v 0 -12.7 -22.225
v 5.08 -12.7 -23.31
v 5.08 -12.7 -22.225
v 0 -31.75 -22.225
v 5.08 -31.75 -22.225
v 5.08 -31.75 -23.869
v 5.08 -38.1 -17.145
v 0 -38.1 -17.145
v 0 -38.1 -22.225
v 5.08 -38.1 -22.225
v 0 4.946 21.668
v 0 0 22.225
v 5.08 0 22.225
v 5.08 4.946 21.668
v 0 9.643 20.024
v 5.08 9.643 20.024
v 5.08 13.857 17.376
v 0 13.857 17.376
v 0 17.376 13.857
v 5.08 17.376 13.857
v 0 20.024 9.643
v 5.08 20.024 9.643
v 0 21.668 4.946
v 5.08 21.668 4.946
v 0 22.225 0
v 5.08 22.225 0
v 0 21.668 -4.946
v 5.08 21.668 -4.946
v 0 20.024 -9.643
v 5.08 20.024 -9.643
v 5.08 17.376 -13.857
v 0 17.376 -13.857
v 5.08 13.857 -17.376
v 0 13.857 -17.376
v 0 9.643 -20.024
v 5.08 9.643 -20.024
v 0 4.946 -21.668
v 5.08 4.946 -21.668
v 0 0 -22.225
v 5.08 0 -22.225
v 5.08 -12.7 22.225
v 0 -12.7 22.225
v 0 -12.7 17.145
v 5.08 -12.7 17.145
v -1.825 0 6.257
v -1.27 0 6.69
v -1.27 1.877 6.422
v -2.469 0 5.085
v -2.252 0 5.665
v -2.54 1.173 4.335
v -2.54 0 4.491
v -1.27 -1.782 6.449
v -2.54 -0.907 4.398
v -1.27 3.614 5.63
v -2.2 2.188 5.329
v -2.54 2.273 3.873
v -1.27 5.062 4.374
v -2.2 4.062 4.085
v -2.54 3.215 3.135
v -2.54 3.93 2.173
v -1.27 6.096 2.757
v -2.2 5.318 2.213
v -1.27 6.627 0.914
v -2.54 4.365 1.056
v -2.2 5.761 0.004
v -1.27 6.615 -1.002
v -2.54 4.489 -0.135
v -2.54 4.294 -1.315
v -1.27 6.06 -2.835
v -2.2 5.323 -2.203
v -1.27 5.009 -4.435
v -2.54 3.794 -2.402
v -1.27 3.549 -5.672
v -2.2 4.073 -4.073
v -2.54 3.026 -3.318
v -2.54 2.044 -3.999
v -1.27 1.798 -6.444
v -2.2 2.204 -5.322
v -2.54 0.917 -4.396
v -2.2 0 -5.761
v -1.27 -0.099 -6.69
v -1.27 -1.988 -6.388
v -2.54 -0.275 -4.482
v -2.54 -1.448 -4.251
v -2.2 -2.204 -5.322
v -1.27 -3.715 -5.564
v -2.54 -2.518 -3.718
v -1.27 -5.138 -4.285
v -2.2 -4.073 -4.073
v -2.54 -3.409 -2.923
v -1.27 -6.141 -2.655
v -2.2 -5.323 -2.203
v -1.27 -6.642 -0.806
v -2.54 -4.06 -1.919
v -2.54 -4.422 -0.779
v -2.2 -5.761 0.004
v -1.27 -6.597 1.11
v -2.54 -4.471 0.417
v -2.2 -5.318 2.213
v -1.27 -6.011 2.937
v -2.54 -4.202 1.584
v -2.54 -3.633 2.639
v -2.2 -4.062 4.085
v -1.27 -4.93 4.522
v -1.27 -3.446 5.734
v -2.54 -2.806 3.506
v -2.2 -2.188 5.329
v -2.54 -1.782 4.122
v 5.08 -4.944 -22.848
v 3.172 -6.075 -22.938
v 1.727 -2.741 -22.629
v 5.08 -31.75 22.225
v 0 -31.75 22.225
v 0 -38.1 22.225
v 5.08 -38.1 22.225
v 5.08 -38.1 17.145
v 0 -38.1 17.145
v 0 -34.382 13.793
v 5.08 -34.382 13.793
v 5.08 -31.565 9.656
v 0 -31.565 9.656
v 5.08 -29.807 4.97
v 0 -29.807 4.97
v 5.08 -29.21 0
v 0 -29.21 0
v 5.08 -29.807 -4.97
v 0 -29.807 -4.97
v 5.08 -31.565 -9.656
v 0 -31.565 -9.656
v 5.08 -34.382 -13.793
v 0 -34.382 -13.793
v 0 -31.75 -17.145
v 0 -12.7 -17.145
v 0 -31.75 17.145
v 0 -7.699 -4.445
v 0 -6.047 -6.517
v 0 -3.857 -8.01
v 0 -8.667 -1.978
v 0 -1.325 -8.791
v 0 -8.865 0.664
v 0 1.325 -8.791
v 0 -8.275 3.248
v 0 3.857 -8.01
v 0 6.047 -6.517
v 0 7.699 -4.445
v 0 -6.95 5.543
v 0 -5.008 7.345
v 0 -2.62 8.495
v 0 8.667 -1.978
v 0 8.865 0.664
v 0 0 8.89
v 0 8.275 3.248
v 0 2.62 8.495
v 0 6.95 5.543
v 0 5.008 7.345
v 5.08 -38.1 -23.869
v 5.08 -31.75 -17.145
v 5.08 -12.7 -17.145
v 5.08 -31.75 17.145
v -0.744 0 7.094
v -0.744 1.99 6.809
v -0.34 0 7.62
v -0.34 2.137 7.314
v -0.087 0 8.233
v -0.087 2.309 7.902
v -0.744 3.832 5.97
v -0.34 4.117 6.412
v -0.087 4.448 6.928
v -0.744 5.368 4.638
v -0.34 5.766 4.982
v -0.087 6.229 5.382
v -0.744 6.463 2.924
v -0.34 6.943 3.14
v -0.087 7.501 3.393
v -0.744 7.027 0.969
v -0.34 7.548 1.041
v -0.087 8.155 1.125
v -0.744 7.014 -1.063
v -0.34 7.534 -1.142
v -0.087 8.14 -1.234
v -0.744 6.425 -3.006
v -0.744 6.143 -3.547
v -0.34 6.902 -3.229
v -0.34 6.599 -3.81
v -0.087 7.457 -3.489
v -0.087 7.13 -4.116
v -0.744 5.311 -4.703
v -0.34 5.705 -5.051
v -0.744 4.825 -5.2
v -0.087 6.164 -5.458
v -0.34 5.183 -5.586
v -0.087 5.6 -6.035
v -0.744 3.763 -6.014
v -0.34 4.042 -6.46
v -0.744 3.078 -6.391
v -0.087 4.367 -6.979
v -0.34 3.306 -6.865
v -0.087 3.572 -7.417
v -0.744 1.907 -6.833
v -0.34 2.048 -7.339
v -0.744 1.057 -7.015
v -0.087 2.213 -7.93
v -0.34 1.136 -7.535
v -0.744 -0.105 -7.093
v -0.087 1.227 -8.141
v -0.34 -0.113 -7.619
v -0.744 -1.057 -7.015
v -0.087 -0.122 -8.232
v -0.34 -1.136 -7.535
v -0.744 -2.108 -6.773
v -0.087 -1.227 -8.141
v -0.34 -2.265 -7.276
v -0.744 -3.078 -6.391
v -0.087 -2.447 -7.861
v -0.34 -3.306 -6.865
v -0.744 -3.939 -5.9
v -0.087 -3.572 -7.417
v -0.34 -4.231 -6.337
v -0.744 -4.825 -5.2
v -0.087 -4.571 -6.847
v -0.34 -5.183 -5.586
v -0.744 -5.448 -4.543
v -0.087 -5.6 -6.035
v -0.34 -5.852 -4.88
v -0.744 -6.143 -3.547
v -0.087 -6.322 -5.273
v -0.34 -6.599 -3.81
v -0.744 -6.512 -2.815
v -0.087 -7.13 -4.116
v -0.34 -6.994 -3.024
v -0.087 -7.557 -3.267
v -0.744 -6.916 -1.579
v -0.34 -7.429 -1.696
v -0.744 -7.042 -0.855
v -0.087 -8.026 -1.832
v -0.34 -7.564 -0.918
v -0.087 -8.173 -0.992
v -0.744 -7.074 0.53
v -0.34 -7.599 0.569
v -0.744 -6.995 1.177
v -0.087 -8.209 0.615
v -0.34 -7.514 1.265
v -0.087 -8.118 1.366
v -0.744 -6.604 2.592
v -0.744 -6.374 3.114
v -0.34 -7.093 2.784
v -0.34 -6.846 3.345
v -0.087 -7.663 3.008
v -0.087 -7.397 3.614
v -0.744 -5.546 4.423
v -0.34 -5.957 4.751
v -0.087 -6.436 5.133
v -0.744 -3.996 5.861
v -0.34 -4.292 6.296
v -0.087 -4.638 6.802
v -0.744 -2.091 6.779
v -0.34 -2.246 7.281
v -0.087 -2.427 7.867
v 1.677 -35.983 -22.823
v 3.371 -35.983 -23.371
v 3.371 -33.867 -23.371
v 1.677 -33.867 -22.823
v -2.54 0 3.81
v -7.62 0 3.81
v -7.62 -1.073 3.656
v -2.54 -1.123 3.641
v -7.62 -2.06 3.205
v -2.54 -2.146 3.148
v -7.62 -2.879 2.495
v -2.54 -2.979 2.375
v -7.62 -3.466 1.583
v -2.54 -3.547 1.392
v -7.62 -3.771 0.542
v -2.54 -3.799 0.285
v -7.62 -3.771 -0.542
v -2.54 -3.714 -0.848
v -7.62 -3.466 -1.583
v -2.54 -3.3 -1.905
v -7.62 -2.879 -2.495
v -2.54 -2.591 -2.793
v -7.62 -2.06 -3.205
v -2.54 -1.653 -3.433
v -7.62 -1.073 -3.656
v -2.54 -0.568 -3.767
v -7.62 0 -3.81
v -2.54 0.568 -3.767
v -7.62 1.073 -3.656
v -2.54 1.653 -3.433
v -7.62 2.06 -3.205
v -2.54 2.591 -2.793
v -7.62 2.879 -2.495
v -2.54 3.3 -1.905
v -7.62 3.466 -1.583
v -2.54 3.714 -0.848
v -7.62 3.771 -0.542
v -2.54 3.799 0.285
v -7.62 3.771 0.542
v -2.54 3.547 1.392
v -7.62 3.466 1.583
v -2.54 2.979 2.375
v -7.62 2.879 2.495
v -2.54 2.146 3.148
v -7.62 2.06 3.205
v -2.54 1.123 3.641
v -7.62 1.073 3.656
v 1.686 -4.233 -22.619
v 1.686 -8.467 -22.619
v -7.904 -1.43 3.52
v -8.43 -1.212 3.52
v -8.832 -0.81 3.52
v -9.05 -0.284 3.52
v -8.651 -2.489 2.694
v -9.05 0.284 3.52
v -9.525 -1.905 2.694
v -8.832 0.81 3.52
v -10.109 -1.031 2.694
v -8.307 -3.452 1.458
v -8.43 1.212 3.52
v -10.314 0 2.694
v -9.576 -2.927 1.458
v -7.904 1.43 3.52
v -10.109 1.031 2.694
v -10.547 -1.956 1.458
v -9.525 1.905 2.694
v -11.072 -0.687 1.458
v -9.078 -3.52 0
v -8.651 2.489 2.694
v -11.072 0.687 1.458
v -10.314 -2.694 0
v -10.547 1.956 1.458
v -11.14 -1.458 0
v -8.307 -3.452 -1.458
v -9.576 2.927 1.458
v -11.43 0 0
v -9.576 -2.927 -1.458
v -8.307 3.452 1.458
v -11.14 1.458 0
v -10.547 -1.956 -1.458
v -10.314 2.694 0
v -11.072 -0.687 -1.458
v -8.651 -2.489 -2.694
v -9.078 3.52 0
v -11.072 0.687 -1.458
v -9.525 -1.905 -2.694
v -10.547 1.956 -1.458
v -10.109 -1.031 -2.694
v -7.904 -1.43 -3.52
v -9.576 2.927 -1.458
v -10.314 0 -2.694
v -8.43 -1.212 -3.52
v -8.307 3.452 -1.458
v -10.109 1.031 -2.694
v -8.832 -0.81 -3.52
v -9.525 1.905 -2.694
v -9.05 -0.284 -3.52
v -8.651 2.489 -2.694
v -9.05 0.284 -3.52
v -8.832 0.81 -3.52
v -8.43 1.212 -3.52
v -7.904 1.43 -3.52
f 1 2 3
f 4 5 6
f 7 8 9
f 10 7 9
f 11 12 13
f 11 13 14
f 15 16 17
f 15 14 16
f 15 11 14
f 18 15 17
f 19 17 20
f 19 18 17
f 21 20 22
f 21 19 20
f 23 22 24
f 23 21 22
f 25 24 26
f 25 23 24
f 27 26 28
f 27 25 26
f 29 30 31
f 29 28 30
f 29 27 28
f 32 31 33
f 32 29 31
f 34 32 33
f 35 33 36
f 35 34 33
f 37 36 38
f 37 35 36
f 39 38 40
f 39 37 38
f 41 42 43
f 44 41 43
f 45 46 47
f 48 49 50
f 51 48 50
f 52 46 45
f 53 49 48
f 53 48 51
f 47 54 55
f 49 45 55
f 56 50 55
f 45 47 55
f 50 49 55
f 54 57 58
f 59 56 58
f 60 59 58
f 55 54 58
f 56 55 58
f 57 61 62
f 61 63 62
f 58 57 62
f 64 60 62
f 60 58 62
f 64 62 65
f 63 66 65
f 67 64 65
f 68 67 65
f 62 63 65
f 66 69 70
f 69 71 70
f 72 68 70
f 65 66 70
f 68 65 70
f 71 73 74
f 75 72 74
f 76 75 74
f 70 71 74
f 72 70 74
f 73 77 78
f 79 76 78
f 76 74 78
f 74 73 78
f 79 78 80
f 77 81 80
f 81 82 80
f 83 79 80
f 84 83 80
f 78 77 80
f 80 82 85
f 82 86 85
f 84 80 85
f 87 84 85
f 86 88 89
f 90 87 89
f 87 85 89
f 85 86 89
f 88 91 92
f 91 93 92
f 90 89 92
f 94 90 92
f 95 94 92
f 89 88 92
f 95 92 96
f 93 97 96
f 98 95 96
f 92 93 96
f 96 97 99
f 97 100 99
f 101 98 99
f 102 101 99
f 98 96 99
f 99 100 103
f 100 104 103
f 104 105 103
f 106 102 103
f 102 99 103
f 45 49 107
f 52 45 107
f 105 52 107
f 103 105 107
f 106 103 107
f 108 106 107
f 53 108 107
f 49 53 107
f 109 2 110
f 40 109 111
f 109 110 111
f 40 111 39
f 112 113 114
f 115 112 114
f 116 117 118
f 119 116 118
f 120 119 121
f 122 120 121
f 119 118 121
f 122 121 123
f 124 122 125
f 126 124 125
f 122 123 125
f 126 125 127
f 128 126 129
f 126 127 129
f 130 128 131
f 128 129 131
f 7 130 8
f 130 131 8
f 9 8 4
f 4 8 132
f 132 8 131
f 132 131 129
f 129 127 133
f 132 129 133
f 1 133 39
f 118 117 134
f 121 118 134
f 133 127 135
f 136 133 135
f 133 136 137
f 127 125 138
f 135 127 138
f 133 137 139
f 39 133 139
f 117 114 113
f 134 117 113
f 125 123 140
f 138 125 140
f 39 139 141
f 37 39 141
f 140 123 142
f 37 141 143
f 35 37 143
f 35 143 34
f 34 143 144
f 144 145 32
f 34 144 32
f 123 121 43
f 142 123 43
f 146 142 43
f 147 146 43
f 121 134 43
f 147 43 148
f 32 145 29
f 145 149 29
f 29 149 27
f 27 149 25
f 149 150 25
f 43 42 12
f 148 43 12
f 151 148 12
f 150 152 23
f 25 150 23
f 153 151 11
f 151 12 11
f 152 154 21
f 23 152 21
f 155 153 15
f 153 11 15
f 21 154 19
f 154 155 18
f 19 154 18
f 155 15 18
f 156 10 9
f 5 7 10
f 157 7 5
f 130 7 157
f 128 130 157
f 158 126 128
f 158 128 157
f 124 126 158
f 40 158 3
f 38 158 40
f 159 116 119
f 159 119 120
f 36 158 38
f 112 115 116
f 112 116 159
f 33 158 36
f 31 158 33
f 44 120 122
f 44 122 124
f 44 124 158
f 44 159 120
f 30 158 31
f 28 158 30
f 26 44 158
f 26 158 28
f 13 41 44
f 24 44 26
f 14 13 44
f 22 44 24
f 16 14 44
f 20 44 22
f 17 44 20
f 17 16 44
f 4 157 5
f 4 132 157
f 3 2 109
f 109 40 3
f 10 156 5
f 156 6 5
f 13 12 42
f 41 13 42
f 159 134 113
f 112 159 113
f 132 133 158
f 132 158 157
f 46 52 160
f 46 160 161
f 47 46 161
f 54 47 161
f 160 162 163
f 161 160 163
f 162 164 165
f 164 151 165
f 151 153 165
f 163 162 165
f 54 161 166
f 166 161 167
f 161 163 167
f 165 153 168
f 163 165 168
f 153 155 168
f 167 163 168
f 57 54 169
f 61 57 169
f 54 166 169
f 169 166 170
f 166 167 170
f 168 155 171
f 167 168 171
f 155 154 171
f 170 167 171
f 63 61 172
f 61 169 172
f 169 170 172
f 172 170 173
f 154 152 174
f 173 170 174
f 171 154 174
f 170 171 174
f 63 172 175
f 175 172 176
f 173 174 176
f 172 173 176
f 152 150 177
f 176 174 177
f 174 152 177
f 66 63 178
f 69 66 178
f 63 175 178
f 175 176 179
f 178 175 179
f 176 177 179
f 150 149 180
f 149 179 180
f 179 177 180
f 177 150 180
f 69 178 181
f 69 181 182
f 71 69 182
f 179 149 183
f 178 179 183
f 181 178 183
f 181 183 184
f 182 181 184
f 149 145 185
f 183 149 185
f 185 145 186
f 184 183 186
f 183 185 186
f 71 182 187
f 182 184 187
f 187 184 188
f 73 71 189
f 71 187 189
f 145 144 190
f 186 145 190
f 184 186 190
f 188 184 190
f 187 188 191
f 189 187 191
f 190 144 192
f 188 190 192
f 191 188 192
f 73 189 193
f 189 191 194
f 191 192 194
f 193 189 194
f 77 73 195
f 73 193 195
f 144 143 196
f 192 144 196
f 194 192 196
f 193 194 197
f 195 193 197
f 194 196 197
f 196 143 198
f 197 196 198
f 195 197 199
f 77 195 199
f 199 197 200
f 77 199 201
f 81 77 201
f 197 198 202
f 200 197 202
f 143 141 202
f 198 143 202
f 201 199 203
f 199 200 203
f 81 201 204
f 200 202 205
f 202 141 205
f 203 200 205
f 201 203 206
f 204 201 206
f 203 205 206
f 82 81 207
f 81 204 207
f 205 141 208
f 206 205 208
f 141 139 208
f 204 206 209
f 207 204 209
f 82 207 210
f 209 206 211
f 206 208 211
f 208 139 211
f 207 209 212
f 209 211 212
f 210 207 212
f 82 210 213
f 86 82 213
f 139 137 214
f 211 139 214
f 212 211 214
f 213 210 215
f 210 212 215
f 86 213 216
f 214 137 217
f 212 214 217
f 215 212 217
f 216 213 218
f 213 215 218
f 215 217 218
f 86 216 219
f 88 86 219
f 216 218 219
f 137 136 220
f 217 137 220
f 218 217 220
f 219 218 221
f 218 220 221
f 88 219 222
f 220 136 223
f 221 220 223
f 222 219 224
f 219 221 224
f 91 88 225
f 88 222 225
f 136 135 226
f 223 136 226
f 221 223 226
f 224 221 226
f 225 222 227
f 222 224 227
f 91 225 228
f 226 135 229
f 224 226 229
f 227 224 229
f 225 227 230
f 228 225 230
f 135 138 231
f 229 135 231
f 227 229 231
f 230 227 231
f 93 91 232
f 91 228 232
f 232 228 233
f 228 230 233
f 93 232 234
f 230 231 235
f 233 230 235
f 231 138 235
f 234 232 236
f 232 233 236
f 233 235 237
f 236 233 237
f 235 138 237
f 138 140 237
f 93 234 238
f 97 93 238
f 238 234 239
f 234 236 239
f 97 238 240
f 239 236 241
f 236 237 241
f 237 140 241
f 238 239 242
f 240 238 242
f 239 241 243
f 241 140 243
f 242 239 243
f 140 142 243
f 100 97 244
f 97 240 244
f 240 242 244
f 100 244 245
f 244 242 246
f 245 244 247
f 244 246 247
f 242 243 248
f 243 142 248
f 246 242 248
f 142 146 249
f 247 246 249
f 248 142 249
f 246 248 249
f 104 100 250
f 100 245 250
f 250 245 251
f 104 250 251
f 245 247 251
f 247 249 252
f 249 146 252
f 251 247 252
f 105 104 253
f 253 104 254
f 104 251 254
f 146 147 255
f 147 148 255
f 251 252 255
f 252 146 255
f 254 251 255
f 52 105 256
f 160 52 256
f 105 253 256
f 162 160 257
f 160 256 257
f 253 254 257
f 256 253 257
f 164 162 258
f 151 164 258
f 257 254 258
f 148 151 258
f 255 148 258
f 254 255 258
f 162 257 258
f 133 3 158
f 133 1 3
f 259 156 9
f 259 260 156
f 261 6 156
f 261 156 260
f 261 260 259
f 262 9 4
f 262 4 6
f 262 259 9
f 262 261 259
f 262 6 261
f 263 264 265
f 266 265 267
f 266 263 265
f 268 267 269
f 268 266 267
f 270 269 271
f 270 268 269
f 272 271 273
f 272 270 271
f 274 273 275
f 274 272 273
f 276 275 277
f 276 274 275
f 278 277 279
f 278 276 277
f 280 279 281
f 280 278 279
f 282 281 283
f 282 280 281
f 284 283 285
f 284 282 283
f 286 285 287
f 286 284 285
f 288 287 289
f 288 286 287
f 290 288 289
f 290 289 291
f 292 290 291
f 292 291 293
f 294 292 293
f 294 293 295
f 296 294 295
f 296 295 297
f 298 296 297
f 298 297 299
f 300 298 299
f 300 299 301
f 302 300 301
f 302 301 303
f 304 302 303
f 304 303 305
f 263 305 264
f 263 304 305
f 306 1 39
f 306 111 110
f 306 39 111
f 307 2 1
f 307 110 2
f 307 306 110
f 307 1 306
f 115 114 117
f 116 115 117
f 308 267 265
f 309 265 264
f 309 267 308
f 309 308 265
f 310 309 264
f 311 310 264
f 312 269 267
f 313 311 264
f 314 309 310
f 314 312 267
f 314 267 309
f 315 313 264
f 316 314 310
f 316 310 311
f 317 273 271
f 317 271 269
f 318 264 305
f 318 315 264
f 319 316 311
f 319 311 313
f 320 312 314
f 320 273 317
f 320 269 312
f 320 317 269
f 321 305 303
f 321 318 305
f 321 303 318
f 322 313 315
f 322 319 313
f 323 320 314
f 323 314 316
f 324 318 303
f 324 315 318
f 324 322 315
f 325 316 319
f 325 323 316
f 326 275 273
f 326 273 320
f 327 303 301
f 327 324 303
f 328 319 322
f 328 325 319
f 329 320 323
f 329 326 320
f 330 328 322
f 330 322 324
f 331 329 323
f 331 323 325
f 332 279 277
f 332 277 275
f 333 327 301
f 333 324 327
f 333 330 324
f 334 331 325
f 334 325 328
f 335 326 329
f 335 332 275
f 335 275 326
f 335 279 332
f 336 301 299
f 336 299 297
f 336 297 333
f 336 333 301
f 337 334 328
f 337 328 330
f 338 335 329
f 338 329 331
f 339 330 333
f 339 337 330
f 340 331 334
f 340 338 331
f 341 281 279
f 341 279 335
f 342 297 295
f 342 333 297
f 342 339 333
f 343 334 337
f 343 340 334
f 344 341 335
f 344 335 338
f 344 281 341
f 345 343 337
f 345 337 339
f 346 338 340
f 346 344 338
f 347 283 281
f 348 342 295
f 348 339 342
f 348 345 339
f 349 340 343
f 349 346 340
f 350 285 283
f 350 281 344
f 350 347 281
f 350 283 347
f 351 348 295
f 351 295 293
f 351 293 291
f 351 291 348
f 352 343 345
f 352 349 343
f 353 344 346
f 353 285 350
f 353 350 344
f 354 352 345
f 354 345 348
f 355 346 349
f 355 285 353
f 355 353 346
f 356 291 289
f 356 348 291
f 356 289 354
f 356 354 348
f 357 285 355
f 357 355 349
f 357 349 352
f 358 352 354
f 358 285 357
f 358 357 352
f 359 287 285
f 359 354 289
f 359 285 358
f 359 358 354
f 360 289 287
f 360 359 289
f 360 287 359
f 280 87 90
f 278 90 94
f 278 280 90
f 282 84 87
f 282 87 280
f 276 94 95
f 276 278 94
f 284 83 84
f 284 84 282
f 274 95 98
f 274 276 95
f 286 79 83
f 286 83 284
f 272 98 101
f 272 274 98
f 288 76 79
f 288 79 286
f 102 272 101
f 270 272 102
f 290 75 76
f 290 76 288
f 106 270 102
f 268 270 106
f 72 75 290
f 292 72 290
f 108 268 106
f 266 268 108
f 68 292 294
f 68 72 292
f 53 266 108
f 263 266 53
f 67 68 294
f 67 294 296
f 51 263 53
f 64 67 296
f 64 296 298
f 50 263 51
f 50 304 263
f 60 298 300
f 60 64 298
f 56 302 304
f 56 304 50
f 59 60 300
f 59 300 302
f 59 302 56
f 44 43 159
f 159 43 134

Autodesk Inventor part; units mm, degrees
ref_plane "YZ Plane" through (0, 0, 0) normal (1, 0, 0) x (0, 1, 0)
ref_plane "XZ Plane" through (0, 0, 0) normal (0, 1, 0) x (-1, 0, 0)
ref_plane "XY Plane" through (0, 0, 0) normal (0, 0, 1) x (1, 0, 0)
sketch "Sketch1" plane through (0, 0, 0) normal (1, 0, 0) x (0, 1, 0)
  line L0 (-25.4, -22.225) -> (0, -22.225)
  line L1 (0, -22.225) -> (0, 22.225) construction
  line L2 (0, 22.225) -> (-25.4, 22.225)
  line L3 (-25.4, 22.225) -> (-25.4, -22.225) construction
  line L4 (-25.4, 0) -> (0, 0) construction
  arc A0 (0, -22.225) -> (0, 22.225) centre (0, 0) ccw
  circle A1 centre (-25.4, 0) radius 3.81 construction
  circle A2 centre (0, 0) radius 3.81
  line L5 (-25.4, 22.225) -> (-38.1, 22.225)
  line L6 (-38.1, 22.225) -> (-38.1, -22.225)
  line L7 (-38.1, -22.225) -> (-25.4, -22.225)
  line L8 (0, -5.7) -> (0, 5.7) construction
  line L9 (5.6896, 0) -> (-18.1104, 0) construction
  point P0 (0, 0)
  dimension "d0" = 25.4
  dimension "d1" = 44.45
  dimension "d2" = 7.62
  dimension "d3" = 12.7
extrude "Extrusion1" add sketch "Sketch1" along normal blind 5.08 contours L7 L6 L5 L2 A0 L0 | A2
sketch "Sketch2" plane through (0, 0, 0) normal (-1, 0, 0) x (0, 0, 1)
  line L0 (-22.225, -38.1) -> (-22.225, 0) projected
  line L1 (22.225, -38.1) -> (-22.225, -38.1) projected
  line L2 (22.225, 0) -> (22.225, -38.1) projected
  line L3 (-22.225, 0) -> (22.225, 0) construction
  line L4 (-22.225, -12.7) -> (-17.145, -12.7)
  line L5 (-17.145, -12.7) -> (-17.145, -31.75)
  line L6 (-17.145, -31.75) -> (-22.225, -31.75)
  line L7 (-22.225, -31.75) -> (-22.225, -12.7)
  line L8 (22.225, -12.7) -> (17.145, -12.7)
  line L9 (17.145, -12.7) -> (17.145, -31.75)
  line L10 (17.145, -31.75) -> (22.225, -31.75)
  line L11 (22.225, -31.75) -> (22.225, -12.7)
  line L12 (0, -38.1) -> (0, 0)
  dimension "d12" = 38.1
  dimension "d13" = 5.08
  dimension "d14" = 5.08
  dimension "d15" = 19.05
  dimension "d16" = 12.7
extrude "Extrusion2" cut sketch "Sketch2" against normal through all
sketch "Sketch3" plane through (0, 0, 0) normal (-1, 0, 0) x (0, 0, 1)
  arc A0 (22.225, 0) -> (-22.225, 0) centre (0, 0) ccw projected
  circle A1 centre (0, 0) radius 6.35
  dimension "d19" = 12.7
extrude "Extrusion3" add sketch "Sketch3" along normal blind 2.54
sketch "Sketch4" plane through (-2.54, 0, 0) normal (-1, 0, 0) x (0, 0, 1)
  circle A0 centre (0, 0) radius 6.35 projected
  circle A1 centre (0, 0) radius 3.81
  dimension "d22" = 7.62
extrude "Extrusion4" add sketch "Sketch4" along normal blind 5.08 contours A1
sketch "Sketch5" plane through (-7.62, 0, 0) normal (-1, 0, 0) x (0, 0, 1)
  circle A0 centre (0, 0) radius 3.81 projected
  line L0 (-3.81, 0) -> (3.81, 0)
revolve "Revolution1" add sketch "Sketch5" angle 180 about axis through (-7.62, 0, -3.81) along (0, 0, 1) picked at (0.9506, 0.8422) contours L0 A0
sketch "Sketch6" plane through (0, 0, 0) normal (-1, 0, 0) x (0, 0, 1)
  line L0 (-22.225, -38.1) -> (-22.225, -31.75) projected
  line L1 (22.225, -38.1) -> (-22.225, -38.1) projected
  line L2 (-22.225, -12.7) -> (-17.145, -12.7) projected
  line L3 (-17.145, -12.7) -> (-17.145, -31.75) projected
  line L4 (-22.225, -31.75) -> (-23.8687, -31.75)
  spline S0 degree 3 poles (-24.3389, -38.1) (-24.1438, -35.6808) (-23.9932, -34.219) (-23.8687, -31.75) knots -0.835253 -0.835253 -0.835253 -0.835253 -0.05147 -0.05147 -0.05147 -0.05147
  line L5 (-22.225, -38.1) -> (-24.3389, -38.1)
  line L6 (-17.145, -38.1) -> (-17.145, -31.75)
  line L7 (-23.3095, -12.7) -> (-22.225, -12.7)
  line L8 (-17.145, -12.7) -> (-17.145, 0)
  line L9 (-17.145, 0) -> (-22.225, 0)
  spline S1 degree 3 poles (-23.3095, -12.7) (-23.2316, -10.9447) (-23.0986, -8.2586) (-22.7786, -3.8937) (-22.5606, -1.8124) (-22.225, 0) knots -1.036051 -1.036051 -1.036051 -1.036051 -0.552963 -0.552963 0 0 0 0
  line L10 (-22.225, -12.7) -> (-22.225, 0)
  line L11 (-22.225, -31.75) -> (-22.225, -38.1)
  dimension "d26" = 6.35
  dimension "d27" = 6.7237
  dimension "d28" = 7.1939
  dimension "d29" = 12.7
  dimension "d30" = 6.1645
  dimension "d31" = 5.08
extrude "Extrusion5" add sketch "Sketch6" against normal up to surface (5.08 mm away) contours L5 S0 L4 L0 | L7 S1 L10
sketch "Sketch7" plane through (0, -12.7, -17.145) normal (0, -1, 0) x (1, 0, 0)
  line L0 (0, 0) -> (5.08, 0) projected
  line L1 (0, -6.1645) -> (5.08, -6.1645) projected
  line L2 (10.233, 22.3578) -> (10.233, -6.8582) construction
  line L3 (5.08, 0) -> (0, 0)
  line L4 (5.08, -6.1645) -> (5.08, 0)
  spline S0 degree 3 poles (0, -5.08) (1.6825, -5.4909) (3.3765, -5.8525) (5.08, -6.1645) knots -0.570375 -0.570375 -0.570375 -0.570375 -0.050806 -0.050806 -0.050806 -0.050806
  line L5 (0, -5.08) -> (0, 0)
  line L6 (0, 39.37) -> (0, -7.1939) projected
  line L7 (0, -5.08) -> (0, -6.1645)
  line L8 (5.08, -6.1645) -> (0, -6.1645)
  point P0 (0, 17.145)
  dimension "d37" = 5.08
  dimension "d38" = 6.1645
  dimension "d39" = 5.08
extrude "Extrusion6" cut sketch "Sketch7" against normal through all contours S0 L1 L6
sketch "Sketch8" plane through (0, -31.75, -17.145) normal (0, 1, 0) x (1, 0, 0)
  line L0 (0, 0) -> (5.08, 0)
  line L1 (0, 5.08) -> (0, 0)
  spline S0 degree 3 poles (5.08, 6.7237) (3.3633, 6.251) (1.6683, 5.7026) (0, 5.08) knots -0.534217 -0.534217 -0.534217 -0.534217 0 0 0 0
  line L2 (5.08, 0) -> (5.08, 6.7237)
  line L3 (5.08, 6.1645) -> (5.08, 0) projected
  line L4 (0, 0) -> (5.08, 0) projected
  line L5 (5.08, 6.7237) -> (0, 6.7237)
  line L6 (0, 6.7237) -> (0, 5.08)
  line L7 (5.08, 6.7237) -> (5.08, 7.1939) projected
  line L8 (0, 7.1939) -> (5.08, 7.1939) projected
  line L9 (0, 6.7237) -> (0, 7.1939) projected
  line L10 (0, 6.7237) -> (5.08, 6.7237) projected
  line L11 (0, 6.7237) -> (5.08, 6.7237)
  line L12 (5.08, 6.7237) -> (5.08, 7.1939)
  line L13 (5.08, 7.1939) -> (0, 7.1939)
  line L14 (0, 7.1939) -> (0, 6.7237)
  point P0 (0, -17.145)
  dimension "d42" = 5.08
  dimension "d43" = 5.08
  dimension "d44" = 6.7237
extrude "Extrusion7" cut sketch "Sketch8" against normal through all contours L6 L5 S0 | L5 L9 L8 L7
sketch "Sketch9" plane through (0, 0, 0) normal (-1, 0, 0) x (0, 0, 1)
  line L0 (22.225, -38.1) -> (-22.225, -38.1) projected
  line L1 (-17.145, -31.75) -> (-22.225, -31.75) projected
  line L2 (-17.145, -31.75) -> (-17.145, -38.1) construction
  line L3 (17.145, -31.75) -> (17.145, -38.1) construction
  arc A0 (17.145, -38.1) -> (-17.145, -38.1) centre (0, -50.1877) ccw
  line L4 (0, -38.1) -> (0, -29.21) construction
  dimension "d47" = 8.89
extrude "Extrusion8" cut sketch "Sketch9" against normal through all
fillet "Fillet1" radius 2.54 2 edges at (0, 0, -6.35) (-2.54, 0, -6.35)
properties part number "upper_pin"
